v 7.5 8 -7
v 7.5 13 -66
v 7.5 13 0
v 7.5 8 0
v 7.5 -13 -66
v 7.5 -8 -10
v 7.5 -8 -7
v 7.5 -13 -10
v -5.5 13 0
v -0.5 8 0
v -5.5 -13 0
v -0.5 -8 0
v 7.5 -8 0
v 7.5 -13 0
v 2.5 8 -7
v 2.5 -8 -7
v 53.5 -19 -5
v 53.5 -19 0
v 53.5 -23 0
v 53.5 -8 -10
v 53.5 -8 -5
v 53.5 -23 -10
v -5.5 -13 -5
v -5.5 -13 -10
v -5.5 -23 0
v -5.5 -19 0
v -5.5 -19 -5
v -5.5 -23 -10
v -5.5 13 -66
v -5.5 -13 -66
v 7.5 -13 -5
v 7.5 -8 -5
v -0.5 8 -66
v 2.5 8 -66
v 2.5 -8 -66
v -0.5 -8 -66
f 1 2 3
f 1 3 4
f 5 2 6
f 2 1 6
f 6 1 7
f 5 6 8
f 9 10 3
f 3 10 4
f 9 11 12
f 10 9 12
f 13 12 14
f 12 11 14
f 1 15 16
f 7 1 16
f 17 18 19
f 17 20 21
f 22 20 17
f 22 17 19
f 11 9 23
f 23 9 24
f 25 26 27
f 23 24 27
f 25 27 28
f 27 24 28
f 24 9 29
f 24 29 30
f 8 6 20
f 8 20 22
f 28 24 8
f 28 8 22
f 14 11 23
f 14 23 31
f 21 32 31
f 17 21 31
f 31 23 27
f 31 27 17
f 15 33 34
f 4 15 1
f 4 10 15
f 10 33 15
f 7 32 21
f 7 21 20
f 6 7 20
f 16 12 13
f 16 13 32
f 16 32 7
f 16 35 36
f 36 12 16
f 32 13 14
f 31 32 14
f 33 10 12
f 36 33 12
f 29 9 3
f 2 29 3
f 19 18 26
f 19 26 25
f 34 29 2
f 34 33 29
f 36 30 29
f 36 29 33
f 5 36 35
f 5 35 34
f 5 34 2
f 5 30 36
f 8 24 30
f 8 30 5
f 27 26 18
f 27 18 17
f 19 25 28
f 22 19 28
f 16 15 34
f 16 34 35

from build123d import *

# Parameters (mm, degrees)
SKETCH001_W             = 13
SKETCH001_H             = 26
SKETCH001_W_2           = 3
SKETCH001_H_2           = 16
PAD001_DEPTH            = 66
BOX_W                   = 16
BOX_H                   = 7
BOX_DEPTH               = 8
BOX001_W                = 15
BOX001_H                = 5
BOX001_DEPTH            = 59
BOX002_W                = 4
BOX002_H                = 5
BOX002_DEPTH            = 59
BODY001_PLACEMENT_ANGLE = 180


with BuildPart() as part:
    # Sketch001 → Pad001 (new body)
    with BuildSketch(Plane.XY):
        with Locations((1, 0)):
            Rectangle(SKETCH001_W, SKETCH001_H)
        with Locations((1, 0)):
            Rectangle(SKETCH001_W_2, SKETCH001_H_2, mode=Mode.SUBTRACT)
    extrude(amount=PAD001_DEPTH)

    # Box → Box (cut)
    with BuildSketch(Plane(origin=(0, -8, 0), x_dir=(0, 1, 0), z_dir=(1, 0, 0))):
        with Locations((8, 3.5)):
            Rectangle(BOX_W, BOX_H)
    extrude(amount=BOX_DEPTH, mode=Mode.SUBTRACT)

    # Box001 → Box001 (join)
    with BuildSketch(Plane(origin=(-5.5, 8, 5), x_dir=(0, 1, 0), z_dir=(1, 0, 0))):
        with Locations((7.5, 2.5)):
            Rectangle(BOX001_W, BOX001_H)
    extrude(amount=BOX001_DEPTH)

    # Box002 → Box002 (join)
    with BuildSketch(Plane(origin=(-5.5, 19, 0), x_dir=(0, 1, 0), z_dir=(1, 0, 0))):
        with Locations((2, 2.5)):
            Rectangle(BOX002_W, BOX002_H)
    extrude(amount=BOX002_DEPTH)


with BuildPart() as part_1:
    # Body001 placement: moved
    add(part.part.rotate(Axis((0, 0, 0), (1, 0, 0)), BODY001_PLACEMENT_ANGLE))


solid = part_1.part
